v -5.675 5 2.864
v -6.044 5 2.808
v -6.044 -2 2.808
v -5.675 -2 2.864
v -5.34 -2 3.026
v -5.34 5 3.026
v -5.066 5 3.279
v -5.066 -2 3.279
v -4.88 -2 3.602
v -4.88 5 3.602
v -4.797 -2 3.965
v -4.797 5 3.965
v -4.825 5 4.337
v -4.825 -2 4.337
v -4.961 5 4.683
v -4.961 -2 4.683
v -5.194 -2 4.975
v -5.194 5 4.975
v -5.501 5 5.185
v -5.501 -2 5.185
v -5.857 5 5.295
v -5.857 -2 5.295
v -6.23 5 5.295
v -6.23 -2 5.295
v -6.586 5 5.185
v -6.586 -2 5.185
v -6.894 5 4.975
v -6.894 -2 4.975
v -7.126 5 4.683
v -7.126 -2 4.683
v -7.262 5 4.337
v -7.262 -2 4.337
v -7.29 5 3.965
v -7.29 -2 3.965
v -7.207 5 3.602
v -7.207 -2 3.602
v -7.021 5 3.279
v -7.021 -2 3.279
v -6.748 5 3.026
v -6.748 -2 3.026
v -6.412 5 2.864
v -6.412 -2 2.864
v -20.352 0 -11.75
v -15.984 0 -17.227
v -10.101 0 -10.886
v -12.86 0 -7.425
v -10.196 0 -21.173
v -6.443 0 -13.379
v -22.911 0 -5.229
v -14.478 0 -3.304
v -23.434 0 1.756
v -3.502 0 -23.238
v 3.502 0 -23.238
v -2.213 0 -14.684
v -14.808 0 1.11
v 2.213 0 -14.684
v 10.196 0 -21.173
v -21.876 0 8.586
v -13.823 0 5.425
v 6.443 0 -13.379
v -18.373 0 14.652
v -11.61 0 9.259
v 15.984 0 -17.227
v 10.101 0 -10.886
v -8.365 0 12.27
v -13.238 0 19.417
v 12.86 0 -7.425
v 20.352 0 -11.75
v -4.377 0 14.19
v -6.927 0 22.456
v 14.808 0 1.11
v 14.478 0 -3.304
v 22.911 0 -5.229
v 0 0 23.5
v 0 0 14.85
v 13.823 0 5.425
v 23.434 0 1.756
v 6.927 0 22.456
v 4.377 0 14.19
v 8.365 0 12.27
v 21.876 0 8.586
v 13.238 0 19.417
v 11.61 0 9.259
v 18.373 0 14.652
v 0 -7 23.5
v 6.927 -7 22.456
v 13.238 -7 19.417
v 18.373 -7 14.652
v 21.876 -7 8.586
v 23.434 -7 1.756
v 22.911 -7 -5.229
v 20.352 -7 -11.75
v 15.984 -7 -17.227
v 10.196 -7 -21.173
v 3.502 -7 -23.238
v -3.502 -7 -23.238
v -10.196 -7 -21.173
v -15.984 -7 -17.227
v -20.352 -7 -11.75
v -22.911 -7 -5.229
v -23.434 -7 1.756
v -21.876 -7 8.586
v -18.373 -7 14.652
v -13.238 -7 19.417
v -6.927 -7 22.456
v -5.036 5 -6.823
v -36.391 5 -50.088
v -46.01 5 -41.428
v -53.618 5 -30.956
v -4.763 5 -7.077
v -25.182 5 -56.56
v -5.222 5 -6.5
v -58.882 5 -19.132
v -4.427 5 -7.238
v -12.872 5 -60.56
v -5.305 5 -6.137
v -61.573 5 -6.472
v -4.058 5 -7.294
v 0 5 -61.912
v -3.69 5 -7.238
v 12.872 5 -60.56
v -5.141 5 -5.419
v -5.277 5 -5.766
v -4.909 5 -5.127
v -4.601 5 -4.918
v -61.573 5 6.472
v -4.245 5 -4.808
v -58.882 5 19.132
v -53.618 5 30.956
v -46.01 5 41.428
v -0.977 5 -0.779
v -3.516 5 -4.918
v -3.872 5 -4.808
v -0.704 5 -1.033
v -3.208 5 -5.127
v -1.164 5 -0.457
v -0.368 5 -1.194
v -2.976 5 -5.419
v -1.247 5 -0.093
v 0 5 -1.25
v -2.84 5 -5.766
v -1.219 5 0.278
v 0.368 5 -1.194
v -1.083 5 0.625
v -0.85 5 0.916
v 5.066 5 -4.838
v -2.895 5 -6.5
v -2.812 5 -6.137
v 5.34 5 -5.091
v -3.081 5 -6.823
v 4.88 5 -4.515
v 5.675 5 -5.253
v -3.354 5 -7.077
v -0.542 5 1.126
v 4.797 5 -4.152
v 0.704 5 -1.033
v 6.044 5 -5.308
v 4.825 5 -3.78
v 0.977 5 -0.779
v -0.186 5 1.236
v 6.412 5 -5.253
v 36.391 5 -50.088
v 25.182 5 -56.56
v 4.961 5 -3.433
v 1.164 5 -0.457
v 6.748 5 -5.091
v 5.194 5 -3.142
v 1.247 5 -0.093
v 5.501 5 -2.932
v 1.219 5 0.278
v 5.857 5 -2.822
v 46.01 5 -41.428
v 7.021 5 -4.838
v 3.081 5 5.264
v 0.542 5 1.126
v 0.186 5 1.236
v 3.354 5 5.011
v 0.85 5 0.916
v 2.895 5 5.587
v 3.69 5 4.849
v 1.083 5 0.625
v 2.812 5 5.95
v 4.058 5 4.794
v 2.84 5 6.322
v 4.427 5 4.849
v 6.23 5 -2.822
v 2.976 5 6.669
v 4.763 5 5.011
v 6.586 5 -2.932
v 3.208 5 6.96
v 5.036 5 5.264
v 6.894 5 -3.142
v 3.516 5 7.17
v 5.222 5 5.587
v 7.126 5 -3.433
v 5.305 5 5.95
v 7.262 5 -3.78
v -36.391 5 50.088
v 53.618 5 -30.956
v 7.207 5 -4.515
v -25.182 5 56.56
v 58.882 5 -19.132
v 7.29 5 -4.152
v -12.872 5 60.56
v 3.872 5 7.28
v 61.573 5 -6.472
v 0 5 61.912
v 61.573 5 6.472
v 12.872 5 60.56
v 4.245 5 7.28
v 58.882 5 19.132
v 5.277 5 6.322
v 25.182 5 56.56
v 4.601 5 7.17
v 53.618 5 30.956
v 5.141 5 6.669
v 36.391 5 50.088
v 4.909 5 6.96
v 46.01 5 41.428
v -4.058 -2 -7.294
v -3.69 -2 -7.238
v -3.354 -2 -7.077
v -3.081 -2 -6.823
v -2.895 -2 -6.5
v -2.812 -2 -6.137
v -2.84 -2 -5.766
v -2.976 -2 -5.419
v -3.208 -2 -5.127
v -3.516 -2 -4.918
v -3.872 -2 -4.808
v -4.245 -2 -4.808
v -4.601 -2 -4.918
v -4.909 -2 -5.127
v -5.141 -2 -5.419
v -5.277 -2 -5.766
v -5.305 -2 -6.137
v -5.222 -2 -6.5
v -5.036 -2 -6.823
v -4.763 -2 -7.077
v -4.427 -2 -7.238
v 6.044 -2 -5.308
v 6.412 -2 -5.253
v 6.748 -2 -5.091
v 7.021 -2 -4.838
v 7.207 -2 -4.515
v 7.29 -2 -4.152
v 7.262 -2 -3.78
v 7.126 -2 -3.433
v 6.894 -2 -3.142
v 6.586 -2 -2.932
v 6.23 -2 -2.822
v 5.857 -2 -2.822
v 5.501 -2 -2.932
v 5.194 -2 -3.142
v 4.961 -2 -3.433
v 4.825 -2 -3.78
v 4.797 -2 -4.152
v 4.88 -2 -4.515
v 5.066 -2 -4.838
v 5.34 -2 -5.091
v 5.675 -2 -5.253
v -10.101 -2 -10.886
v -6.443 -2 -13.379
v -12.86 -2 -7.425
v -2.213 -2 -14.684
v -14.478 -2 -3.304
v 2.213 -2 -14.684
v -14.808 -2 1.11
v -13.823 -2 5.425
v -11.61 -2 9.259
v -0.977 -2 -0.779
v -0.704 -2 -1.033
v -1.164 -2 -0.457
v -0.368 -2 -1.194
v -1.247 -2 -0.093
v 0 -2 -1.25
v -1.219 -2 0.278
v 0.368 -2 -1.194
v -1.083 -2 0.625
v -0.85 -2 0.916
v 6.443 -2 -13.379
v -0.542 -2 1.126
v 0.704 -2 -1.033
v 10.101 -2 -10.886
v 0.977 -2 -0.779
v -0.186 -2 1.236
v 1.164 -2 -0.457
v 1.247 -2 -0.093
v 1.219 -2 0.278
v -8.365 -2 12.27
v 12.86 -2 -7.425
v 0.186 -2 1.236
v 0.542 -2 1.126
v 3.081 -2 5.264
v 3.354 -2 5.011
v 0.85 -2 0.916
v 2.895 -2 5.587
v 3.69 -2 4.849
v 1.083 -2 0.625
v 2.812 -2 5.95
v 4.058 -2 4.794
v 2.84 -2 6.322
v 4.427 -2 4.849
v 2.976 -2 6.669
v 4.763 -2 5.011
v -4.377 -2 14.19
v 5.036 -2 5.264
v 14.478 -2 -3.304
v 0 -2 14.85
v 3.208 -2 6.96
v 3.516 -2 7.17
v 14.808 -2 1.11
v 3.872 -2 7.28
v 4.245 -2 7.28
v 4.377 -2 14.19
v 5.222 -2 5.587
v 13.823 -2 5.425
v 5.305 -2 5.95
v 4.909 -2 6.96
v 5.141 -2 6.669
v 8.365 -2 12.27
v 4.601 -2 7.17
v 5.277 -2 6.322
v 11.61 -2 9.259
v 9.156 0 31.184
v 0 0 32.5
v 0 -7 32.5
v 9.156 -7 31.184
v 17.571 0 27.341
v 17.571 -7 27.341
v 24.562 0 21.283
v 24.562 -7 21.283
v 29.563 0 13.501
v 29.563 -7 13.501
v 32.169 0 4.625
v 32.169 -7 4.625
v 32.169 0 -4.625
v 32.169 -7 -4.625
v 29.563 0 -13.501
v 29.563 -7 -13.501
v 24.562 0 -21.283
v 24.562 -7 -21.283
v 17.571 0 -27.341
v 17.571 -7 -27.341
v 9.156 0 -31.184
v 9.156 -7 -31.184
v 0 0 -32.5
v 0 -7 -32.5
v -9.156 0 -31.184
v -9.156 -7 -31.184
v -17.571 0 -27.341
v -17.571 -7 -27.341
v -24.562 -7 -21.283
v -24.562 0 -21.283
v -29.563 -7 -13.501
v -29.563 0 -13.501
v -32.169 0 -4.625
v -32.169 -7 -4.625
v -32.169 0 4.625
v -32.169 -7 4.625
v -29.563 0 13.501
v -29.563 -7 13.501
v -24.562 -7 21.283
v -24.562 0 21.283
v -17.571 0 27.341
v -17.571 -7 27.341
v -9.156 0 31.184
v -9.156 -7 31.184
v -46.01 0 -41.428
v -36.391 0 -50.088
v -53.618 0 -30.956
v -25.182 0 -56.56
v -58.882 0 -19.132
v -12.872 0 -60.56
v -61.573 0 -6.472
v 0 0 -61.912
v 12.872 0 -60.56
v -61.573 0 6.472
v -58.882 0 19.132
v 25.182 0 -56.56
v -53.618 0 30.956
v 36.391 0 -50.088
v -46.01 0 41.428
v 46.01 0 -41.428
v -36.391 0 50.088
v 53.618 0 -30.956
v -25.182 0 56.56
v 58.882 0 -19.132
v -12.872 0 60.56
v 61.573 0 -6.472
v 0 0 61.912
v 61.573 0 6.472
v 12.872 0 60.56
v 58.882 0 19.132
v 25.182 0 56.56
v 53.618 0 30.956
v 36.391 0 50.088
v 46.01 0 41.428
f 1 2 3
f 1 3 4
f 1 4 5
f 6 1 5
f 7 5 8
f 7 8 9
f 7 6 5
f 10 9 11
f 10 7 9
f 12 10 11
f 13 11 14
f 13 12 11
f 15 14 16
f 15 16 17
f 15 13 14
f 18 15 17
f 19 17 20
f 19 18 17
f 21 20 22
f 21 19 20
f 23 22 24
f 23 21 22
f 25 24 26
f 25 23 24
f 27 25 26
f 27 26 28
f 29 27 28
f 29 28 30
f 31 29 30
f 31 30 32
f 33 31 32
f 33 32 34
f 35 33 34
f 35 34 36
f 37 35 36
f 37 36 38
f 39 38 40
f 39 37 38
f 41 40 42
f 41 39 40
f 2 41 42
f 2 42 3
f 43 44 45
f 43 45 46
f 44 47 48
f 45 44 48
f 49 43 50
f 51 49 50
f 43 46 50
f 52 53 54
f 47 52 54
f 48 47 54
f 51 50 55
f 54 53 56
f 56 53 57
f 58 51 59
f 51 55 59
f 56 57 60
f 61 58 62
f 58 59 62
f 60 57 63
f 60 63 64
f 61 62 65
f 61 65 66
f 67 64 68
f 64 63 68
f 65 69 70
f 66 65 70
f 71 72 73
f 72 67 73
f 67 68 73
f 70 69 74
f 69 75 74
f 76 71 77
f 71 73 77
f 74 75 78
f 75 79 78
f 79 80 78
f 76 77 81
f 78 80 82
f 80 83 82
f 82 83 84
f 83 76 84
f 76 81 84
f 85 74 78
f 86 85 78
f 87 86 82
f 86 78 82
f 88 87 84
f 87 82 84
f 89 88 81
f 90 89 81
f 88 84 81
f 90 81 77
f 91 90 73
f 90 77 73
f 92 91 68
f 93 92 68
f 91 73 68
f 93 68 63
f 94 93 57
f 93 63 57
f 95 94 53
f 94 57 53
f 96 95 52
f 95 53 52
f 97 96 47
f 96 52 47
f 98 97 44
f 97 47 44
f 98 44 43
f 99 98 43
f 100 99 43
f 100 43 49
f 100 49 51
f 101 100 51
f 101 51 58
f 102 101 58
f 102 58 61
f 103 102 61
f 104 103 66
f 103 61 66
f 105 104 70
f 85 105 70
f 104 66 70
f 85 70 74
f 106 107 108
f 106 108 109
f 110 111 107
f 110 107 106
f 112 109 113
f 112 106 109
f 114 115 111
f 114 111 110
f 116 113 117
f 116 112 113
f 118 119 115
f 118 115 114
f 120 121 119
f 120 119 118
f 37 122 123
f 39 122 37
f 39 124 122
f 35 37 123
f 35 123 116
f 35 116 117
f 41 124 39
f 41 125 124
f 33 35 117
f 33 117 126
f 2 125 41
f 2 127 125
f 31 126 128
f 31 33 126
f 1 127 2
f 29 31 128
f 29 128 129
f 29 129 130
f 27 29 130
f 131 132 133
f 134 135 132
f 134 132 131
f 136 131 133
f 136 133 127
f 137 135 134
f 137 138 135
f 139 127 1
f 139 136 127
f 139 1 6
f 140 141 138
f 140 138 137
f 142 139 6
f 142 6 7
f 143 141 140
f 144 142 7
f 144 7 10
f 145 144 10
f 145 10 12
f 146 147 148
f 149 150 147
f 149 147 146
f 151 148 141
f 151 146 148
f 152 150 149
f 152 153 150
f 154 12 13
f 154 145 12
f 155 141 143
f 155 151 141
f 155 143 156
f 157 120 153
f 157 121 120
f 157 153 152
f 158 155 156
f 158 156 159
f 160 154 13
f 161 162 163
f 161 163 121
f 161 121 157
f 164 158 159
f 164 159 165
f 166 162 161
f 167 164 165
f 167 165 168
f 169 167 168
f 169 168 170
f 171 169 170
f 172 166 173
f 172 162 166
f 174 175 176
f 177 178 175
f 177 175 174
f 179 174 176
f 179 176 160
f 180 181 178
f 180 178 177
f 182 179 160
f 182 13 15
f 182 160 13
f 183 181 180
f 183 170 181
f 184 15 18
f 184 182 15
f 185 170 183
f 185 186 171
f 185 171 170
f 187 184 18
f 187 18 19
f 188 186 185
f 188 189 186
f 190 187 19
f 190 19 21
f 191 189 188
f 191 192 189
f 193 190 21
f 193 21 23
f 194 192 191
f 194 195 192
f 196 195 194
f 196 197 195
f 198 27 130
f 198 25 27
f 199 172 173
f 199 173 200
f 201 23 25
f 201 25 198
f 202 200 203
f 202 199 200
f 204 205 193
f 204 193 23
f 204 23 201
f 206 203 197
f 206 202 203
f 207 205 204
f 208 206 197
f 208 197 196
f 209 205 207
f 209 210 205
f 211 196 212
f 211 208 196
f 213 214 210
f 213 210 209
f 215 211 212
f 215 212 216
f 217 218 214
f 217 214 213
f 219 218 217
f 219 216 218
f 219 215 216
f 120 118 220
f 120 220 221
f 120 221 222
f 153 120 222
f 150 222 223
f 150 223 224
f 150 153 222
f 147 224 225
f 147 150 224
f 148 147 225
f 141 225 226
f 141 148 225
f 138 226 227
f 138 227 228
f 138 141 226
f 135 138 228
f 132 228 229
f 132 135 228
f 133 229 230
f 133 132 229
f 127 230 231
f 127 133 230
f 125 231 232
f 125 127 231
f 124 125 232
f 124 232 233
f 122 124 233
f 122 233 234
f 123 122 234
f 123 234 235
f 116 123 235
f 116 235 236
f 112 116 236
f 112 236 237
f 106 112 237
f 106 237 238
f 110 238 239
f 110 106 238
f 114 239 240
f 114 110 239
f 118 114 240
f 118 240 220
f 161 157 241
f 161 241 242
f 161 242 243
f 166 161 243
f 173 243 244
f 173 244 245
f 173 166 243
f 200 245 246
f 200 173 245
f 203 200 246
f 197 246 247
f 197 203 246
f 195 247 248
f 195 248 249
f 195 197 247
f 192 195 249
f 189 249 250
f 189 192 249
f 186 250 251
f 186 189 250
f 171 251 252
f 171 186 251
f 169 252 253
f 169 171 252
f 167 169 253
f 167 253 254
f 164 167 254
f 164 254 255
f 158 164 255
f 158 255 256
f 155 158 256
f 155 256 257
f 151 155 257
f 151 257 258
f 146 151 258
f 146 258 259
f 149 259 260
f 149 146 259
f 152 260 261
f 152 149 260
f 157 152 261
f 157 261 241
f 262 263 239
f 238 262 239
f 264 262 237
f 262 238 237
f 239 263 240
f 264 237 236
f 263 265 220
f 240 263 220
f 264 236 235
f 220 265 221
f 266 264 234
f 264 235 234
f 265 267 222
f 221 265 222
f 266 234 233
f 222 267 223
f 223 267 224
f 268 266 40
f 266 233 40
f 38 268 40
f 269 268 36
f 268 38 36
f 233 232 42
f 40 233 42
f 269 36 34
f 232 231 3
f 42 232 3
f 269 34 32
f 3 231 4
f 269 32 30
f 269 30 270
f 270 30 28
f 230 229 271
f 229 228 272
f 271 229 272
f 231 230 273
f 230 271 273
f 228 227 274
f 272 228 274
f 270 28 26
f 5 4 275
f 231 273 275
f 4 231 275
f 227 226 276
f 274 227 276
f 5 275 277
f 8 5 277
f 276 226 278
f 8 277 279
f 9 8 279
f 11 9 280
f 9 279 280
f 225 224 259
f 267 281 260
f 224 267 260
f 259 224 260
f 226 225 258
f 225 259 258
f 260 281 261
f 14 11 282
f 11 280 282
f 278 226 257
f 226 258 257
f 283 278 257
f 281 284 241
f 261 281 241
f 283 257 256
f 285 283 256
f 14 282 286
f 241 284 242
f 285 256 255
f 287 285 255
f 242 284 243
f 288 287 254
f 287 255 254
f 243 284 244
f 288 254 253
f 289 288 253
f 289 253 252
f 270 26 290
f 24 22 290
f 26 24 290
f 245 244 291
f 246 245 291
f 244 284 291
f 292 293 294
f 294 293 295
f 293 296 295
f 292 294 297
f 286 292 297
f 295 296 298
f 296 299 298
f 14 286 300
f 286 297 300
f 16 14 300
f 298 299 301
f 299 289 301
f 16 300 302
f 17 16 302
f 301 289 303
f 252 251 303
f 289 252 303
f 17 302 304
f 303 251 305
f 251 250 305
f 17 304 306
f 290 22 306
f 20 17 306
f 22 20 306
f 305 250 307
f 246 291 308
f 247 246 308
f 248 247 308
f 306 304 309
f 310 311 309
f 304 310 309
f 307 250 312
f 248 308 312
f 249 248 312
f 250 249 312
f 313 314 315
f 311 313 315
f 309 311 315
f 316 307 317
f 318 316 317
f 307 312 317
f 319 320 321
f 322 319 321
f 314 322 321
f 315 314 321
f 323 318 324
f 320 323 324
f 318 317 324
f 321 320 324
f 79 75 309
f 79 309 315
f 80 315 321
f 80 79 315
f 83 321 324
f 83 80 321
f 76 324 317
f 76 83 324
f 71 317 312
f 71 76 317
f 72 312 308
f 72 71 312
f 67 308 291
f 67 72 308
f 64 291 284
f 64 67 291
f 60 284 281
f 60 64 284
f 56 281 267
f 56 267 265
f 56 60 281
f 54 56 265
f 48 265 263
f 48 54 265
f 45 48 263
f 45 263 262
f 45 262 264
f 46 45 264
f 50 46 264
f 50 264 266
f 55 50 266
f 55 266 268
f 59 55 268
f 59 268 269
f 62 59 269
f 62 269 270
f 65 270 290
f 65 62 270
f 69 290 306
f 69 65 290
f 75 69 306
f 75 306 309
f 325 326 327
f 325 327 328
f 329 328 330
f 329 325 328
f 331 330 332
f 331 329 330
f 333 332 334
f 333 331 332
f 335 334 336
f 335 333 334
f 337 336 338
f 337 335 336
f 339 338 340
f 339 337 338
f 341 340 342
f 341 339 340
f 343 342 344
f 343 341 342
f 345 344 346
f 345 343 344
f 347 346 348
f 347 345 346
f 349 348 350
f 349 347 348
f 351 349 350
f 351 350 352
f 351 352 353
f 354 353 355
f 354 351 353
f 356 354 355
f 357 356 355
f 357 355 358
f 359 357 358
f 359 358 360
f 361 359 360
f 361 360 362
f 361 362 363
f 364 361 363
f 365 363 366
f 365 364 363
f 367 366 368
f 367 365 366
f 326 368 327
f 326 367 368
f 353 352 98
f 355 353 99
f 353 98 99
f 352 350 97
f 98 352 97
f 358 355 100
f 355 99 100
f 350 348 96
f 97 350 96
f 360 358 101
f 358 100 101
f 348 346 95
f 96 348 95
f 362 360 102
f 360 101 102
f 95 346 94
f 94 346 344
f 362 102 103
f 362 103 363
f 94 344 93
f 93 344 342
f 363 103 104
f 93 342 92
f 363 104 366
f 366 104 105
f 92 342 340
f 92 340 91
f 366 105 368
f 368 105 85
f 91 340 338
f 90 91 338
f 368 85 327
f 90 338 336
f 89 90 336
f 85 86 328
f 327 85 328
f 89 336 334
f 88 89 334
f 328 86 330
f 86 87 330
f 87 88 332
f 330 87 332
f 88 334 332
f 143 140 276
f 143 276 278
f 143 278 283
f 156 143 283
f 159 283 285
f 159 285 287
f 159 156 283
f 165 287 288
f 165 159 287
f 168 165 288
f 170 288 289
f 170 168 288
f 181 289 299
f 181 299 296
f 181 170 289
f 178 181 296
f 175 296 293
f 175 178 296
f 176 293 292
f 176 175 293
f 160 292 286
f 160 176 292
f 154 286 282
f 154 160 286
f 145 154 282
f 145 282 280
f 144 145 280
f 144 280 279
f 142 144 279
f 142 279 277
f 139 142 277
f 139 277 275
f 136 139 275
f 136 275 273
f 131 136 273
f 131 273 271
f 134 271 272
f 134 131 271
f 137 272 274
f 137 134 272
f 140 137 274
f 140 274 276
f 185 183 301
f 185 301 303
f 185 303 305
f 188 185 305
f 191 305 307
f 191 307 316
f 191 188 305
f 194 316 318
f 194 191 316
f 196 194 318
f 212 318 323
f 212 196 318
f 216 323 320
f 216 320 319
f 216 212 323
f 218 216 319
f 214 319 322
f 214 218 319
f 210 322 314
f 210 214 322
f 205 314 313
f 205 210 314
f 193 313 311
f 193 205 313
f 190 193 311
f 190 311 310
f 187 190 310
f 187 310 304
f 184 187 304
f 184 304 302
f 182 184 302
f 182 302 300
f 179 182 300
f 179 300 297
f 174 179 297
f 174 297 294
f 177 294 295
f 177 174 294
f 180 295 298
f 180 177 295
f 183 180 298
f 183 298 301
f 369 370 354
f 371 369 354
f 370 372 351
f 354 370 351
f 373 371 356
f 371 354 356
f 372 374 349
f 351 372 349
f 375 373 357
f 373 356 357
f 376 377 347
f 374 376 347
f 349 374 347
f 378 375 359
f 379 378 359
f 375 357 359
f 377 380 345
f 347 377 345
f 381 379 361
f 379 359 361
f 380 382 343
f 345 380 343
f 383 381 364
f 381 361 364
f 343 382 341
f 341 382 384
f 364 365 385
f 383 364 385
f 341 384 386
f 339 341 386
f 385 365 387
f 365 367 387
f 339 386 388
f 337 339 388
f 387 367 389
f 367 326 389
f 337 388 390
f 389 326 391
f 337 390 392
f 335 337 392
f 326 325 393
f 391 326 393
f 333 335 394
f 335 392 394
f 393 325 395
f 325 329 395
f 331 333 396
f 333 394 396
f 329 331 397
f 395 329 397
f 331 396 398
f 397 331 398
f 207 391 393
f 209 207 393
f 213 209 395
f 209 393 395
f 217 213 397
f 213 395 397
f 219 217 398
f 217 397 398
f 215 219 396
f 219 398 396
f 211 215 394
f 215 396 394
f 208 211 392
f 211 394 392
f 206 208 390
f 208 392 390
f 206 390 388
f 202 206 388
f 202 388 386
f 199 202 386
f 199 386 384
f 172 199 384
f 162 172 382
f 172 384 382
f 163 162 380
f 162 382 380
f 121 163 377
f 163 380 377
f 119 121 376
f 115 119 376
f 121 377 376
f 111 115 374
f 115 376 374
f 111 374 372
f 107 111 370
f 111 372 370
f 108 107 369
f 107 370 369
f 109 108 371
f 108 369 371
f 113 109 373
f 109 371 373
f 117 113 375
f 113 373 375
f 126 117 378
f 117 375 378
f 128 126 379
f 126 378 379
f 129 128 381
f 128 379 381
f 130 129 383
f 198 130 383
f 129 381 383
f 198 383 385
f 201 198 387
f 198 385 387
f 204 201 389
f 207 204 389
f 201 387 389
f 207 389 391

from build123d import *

# Parameters (mm, degrees)
SKETCH2_R               = 61.9125
BOSS_EXTRUDE1_DEPTH     = 5
SKETCH3_R               = 32.5
SKETCH3_R_2             = 23.5
BOSS_EXTRUDE2_DEPTH     = 7
SKETCH6_R               = 14.85
BOSS_EXTRUDE3_DEPTH     = 2
CUT_EXTRUDE1_DEPTH      = 2
CUT_EXTRUDE1_DEPTH_BACK = 5
SKETCH5_R               = 1.25


with BuildPart() as part:
    # Sketch2 → Boss-Extrude1 (new body)
    with BuildSketch(Plane(origin=(0, 0, 0), x_dir=(1, 0, 0), z_dir=(0, 1, 0))):
        with Locations(Location((0, 0, 0), (0, 0, 270))):
            Circle(SKETCH2_R)
    extrude(amount=BOSS_EXTRUDE1_DEPTH)

    # Sketch3 → Boss-Extrude2 (add)
    with BuildSketch(Plane(origin=(0, 0, 0), x_dir=(1, 0, 0), z_dir=(0, 1, 0))):
        with Locations(Location((0, 0, 0), (0, 0, 270))):
            Circle(SKETCH3_R)
        with Locations(Location((0, 0, 0), (0, 0, 270))):
            Circle(SKETCH3_R_2, mode=Mode.SUBTRACT)
    extrude(amount=-BOSS_EXTRUDE2_DEPTH)

    # Sketch6 → Boss-Extrude3 (add)
    with BuildSketch(Plane(origin=(0, 0, 0), x_dir=(1, 0, 0), z_dir=(0, 1, 0))):
        with Locations(Location((0, 0, 0), (0, 0, 270))):
            Circle(SKETCH6_R)
    extrude(amount=-BOSS_EXTRUDE3_DEPTH)

    # Sketch5 → Cut-Extrude1 (cut, two sides: drawn at the far end of the back side and taken through both)
    with BuildSketch(Plane(origin=(0, 0, 0), x_dir=(-1, 0, 0), z_dir=(0, -1, 0)).offset(-CUT_EXTRUDE1_DEPTH_BACK)):
        with Locations(Location((0, 0, 0), (0, 0, 90))):
            Circle(SKETCH5_R)
        with Locations(Location((-4.058493048, -6.043759937, 0), (0, 0, 90))):
            Circle(SKETCH5_R)
        with Locations(Location((-6.043759937, 4.058493048, 0), (0, 0, 90))):
            Circle(SKETCH5_R)
        with Locations(Location((4.058493048, 6.043759937, 0), (0, 0, 90))):
            Circle(SKETCH5_R)
        with Locations(Location((6.043759937, -4.058493048, 0), (0, 0, 90))):
            Circle(SKETCH5_R)
    extrude(amount=CUT_EXTRUDE1_DEPTH + CUT_EXTRUDE1_DEPTH_BACK, mode=Mode.SUBTRACT)


solid = part.part
